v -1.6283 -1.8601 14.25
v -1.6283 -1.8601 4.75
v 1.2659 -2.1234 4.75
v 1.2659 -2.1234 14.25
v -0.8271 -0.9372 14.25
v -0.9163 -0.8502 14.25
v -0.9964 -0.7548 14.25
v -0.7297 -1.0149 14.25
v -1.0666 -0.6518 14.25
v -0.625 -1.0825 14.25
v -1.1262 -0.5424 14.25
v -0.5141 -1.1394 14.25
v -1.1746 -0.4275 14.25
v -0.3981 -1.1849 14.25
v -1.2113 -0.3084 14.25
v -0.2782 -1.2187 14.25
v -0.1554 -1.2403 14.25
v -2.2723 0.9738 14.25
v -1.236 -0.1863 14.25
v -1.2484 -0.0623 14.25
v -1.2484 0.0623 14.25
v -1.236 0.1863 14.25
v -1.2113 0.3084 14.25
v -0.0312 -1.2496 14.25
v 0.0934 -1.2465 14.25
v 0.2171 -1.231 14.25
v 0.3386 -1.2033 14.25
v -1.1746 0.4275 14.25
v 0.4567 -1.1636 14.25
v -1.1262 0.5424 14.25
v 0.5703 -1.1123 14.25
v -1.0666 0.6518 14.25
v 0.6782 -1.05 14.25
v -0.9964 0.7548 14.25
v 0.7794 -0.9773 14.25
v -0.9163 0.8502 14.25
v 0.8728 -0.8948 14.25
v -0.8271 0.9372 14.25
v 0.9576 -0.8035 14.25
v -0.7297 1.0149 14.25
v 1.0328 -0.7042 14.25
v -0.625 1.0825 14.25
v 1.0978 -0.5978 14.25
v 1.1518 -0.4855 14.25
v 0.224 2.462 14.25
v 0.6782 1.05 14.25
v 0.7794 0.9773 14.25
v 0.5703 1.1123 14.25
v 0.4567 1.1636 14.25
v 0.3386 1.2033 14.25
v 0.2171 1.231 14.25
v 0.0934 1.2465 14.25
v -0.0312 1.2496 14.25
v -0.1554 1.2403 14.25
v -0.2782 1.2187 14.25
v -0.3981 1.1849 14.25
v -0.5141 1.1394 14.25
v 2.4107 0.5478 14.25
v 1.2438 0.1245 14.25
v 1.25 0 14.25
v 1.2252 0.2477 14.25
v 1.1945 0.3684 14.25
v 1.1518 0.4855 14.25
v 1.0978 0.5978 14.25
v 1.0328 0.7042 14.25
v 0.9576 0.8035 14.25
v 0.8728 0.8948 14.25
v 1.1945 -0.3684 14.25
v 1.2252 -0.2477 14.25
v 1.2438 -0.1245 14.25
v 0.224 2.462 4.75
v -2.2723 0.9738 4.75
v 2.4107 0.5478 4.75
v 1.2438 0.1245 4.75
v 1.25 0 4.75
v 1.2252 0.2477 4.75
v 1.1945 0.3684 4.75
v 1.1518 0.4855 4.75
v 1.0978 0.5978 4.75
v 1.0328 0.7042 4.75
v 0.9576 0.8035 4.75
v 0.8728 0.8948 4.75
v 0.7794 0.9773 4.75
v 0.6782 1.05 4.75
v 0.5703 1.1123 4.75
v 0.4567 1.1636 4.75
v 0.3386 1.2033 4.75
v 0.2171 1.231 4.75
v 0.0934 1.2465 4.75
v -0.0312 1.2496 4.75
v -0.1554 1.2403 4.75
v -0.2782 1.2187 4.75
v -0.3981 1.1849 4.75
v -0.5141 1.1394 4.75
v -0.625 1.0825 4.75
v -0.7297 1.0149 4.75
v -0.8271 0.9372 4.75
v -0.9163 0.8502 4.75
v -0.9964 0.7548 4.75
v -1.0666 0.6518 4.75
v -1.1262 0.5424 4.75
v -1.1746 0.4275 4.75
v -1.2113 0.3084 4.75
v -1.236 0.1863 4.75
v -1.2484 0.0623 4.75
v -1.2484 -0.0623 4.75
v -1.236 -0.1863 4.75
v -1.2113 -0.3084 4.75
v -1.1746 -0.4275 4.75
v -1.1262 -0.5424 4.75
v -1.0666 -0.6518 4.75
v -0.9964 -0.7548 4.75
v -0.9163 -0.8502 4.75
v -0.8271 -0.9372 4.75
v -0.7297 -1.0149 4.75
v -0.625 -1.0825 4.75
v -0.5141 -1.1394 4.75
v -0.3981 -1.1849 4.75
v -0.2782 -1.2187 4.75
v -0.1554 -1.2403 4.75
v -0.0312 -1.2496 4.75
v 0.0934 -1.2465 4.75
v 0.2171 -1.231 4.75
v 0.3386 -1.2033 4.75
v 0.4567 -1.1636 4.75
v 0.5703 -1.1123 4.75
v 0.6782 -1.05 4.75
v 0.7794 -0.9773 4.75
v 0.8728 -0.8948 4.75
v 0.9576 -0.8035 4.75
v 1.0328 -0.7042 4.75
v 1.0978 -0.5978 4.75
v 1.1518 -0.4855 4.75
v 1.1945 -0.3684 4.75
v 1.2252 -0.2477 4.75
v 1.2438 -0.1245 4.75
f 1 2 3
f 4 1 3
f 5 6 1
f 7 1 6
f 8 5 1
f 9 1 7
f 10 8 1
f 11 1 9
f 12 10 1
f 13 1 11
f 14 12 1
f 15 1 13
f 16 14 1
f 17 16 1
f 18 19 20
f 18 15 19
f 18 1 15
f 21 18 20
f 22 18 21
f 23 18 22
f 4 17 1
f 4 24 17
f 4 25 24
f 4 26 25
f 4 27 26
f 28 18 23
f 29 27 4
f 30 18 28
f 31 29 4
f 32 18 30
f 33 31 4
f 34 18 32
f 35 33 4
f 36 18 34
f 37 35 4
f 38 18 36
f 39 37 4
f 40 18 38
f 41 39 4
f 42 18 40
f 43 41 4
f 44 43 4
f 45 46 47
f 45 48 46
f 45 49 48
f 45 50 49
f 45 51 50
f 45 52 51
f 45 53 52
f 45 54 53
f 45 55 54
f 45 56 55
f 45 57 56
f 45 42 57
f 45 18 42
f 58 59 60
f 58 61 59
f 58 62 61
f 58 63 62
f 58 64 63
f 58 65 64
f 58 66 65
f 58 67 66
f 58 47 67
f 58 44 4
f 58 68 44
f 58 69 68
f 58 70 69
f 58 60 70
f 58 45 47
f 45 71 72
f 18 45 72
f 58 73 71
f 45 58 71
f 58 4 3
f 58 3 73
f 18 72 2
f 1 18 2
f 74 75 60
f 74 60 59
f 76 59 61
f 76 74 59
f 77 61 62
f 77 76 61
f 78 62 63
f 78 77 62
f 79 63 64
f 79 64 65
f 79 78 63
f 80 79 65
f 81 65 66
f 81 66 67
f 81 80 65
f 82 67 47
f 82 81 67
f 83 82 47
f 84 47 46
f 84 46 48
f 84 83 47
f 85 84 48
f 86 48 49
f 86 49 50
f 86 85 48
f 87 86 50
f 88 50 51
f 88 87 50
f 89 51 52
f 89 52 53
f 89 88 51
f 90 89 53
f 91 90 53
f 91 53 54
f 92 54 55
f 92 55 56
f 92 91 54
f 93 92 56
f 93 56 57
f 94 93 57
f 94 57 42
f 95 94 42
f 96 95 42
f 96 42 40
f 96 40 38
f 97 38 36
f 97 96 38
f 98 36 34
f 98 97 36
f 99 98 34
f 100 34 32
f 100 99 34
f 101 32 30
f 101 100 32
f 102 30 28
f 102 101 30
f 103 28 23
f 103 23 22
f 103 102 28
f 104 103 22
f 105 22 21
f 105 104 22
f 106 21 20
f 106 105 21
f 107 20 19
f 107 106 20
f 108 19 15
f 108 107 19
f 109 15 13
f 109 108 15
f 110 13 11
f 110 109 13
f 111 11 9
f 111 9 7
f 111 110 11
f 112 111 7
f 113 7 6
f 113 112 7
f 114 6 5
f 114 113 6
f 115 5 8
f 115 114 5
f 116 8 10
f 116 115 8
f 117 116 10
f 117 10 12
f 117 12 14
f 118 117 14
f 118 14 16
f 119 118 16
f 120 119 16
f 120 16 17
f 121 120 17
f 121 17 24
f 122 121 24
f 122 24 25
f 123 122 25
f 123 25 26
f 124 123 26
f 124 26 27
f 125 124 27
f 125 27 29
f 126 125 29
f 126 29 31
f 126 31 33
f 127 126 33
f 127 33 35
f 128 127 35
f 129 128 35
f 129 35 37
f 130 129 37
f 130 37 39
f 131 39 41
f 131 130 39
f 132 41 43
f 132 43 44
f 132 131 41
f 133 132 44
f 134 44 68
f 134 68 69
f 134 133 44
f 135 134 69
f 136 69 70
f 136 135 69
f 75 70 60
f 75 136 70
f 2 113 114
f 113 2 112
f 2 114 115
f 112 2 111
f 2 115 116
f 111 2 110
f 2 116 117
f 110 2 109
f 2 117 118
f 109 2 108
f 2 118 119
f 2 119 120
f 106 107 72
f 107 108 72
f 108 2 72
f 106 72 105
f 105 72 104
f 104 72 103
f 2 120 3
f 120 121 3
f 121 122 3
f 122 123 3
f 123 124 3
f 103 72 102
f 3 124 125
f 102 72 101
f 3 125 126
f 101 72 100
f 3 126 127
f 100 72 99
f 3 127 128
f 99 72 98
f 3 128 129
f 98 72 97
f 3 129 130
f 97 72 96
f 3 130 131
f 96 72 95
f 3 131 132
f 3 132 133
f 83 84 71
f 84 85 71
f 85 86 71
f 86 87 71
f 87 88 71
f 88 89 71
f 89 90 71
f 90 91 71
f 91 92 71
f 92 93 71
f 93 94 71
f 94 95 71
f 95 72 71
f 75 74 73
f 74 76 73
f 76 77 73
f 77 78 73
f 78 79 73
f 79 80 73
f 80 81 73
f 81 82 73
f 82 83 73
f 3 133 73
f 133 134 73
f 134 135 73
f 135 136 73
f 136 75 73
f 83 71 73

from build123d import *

# Parameters (mm, degrees)
IZIM1_R                     = 2.5
Y_KSEKLIK_EKSTR_ZYON1_DEPTH = 19
SCALE1_SCALE                = 0.5


with BuildPart() as part:
    # Çizim1 → Yükseklik-Ekstrüzyon1 (new body)
    with BuildSketch(Plane.XY):
        Polygon((0.447956651, 4.923937404), (-4.544516536, 1.947612429), (-3.256622333, -3.720246726), (2.531813246, -4.246851352), (4.821368972, 1.095548245), align=None)
        Circle(IZIM1_R, mode=Mode.SUBTRACT)
    extrude(amount=Y_KSEKLIK_EKSTR_ZYON1_DEPTH)


with BuildPart() as part_1:
    # Scale1: scaled about (0, 0, 9.5)
    add(part.part.scale(SCALE1_SCALE).moved(Location((0, 0, 4.75))))


solid = part_1.part
